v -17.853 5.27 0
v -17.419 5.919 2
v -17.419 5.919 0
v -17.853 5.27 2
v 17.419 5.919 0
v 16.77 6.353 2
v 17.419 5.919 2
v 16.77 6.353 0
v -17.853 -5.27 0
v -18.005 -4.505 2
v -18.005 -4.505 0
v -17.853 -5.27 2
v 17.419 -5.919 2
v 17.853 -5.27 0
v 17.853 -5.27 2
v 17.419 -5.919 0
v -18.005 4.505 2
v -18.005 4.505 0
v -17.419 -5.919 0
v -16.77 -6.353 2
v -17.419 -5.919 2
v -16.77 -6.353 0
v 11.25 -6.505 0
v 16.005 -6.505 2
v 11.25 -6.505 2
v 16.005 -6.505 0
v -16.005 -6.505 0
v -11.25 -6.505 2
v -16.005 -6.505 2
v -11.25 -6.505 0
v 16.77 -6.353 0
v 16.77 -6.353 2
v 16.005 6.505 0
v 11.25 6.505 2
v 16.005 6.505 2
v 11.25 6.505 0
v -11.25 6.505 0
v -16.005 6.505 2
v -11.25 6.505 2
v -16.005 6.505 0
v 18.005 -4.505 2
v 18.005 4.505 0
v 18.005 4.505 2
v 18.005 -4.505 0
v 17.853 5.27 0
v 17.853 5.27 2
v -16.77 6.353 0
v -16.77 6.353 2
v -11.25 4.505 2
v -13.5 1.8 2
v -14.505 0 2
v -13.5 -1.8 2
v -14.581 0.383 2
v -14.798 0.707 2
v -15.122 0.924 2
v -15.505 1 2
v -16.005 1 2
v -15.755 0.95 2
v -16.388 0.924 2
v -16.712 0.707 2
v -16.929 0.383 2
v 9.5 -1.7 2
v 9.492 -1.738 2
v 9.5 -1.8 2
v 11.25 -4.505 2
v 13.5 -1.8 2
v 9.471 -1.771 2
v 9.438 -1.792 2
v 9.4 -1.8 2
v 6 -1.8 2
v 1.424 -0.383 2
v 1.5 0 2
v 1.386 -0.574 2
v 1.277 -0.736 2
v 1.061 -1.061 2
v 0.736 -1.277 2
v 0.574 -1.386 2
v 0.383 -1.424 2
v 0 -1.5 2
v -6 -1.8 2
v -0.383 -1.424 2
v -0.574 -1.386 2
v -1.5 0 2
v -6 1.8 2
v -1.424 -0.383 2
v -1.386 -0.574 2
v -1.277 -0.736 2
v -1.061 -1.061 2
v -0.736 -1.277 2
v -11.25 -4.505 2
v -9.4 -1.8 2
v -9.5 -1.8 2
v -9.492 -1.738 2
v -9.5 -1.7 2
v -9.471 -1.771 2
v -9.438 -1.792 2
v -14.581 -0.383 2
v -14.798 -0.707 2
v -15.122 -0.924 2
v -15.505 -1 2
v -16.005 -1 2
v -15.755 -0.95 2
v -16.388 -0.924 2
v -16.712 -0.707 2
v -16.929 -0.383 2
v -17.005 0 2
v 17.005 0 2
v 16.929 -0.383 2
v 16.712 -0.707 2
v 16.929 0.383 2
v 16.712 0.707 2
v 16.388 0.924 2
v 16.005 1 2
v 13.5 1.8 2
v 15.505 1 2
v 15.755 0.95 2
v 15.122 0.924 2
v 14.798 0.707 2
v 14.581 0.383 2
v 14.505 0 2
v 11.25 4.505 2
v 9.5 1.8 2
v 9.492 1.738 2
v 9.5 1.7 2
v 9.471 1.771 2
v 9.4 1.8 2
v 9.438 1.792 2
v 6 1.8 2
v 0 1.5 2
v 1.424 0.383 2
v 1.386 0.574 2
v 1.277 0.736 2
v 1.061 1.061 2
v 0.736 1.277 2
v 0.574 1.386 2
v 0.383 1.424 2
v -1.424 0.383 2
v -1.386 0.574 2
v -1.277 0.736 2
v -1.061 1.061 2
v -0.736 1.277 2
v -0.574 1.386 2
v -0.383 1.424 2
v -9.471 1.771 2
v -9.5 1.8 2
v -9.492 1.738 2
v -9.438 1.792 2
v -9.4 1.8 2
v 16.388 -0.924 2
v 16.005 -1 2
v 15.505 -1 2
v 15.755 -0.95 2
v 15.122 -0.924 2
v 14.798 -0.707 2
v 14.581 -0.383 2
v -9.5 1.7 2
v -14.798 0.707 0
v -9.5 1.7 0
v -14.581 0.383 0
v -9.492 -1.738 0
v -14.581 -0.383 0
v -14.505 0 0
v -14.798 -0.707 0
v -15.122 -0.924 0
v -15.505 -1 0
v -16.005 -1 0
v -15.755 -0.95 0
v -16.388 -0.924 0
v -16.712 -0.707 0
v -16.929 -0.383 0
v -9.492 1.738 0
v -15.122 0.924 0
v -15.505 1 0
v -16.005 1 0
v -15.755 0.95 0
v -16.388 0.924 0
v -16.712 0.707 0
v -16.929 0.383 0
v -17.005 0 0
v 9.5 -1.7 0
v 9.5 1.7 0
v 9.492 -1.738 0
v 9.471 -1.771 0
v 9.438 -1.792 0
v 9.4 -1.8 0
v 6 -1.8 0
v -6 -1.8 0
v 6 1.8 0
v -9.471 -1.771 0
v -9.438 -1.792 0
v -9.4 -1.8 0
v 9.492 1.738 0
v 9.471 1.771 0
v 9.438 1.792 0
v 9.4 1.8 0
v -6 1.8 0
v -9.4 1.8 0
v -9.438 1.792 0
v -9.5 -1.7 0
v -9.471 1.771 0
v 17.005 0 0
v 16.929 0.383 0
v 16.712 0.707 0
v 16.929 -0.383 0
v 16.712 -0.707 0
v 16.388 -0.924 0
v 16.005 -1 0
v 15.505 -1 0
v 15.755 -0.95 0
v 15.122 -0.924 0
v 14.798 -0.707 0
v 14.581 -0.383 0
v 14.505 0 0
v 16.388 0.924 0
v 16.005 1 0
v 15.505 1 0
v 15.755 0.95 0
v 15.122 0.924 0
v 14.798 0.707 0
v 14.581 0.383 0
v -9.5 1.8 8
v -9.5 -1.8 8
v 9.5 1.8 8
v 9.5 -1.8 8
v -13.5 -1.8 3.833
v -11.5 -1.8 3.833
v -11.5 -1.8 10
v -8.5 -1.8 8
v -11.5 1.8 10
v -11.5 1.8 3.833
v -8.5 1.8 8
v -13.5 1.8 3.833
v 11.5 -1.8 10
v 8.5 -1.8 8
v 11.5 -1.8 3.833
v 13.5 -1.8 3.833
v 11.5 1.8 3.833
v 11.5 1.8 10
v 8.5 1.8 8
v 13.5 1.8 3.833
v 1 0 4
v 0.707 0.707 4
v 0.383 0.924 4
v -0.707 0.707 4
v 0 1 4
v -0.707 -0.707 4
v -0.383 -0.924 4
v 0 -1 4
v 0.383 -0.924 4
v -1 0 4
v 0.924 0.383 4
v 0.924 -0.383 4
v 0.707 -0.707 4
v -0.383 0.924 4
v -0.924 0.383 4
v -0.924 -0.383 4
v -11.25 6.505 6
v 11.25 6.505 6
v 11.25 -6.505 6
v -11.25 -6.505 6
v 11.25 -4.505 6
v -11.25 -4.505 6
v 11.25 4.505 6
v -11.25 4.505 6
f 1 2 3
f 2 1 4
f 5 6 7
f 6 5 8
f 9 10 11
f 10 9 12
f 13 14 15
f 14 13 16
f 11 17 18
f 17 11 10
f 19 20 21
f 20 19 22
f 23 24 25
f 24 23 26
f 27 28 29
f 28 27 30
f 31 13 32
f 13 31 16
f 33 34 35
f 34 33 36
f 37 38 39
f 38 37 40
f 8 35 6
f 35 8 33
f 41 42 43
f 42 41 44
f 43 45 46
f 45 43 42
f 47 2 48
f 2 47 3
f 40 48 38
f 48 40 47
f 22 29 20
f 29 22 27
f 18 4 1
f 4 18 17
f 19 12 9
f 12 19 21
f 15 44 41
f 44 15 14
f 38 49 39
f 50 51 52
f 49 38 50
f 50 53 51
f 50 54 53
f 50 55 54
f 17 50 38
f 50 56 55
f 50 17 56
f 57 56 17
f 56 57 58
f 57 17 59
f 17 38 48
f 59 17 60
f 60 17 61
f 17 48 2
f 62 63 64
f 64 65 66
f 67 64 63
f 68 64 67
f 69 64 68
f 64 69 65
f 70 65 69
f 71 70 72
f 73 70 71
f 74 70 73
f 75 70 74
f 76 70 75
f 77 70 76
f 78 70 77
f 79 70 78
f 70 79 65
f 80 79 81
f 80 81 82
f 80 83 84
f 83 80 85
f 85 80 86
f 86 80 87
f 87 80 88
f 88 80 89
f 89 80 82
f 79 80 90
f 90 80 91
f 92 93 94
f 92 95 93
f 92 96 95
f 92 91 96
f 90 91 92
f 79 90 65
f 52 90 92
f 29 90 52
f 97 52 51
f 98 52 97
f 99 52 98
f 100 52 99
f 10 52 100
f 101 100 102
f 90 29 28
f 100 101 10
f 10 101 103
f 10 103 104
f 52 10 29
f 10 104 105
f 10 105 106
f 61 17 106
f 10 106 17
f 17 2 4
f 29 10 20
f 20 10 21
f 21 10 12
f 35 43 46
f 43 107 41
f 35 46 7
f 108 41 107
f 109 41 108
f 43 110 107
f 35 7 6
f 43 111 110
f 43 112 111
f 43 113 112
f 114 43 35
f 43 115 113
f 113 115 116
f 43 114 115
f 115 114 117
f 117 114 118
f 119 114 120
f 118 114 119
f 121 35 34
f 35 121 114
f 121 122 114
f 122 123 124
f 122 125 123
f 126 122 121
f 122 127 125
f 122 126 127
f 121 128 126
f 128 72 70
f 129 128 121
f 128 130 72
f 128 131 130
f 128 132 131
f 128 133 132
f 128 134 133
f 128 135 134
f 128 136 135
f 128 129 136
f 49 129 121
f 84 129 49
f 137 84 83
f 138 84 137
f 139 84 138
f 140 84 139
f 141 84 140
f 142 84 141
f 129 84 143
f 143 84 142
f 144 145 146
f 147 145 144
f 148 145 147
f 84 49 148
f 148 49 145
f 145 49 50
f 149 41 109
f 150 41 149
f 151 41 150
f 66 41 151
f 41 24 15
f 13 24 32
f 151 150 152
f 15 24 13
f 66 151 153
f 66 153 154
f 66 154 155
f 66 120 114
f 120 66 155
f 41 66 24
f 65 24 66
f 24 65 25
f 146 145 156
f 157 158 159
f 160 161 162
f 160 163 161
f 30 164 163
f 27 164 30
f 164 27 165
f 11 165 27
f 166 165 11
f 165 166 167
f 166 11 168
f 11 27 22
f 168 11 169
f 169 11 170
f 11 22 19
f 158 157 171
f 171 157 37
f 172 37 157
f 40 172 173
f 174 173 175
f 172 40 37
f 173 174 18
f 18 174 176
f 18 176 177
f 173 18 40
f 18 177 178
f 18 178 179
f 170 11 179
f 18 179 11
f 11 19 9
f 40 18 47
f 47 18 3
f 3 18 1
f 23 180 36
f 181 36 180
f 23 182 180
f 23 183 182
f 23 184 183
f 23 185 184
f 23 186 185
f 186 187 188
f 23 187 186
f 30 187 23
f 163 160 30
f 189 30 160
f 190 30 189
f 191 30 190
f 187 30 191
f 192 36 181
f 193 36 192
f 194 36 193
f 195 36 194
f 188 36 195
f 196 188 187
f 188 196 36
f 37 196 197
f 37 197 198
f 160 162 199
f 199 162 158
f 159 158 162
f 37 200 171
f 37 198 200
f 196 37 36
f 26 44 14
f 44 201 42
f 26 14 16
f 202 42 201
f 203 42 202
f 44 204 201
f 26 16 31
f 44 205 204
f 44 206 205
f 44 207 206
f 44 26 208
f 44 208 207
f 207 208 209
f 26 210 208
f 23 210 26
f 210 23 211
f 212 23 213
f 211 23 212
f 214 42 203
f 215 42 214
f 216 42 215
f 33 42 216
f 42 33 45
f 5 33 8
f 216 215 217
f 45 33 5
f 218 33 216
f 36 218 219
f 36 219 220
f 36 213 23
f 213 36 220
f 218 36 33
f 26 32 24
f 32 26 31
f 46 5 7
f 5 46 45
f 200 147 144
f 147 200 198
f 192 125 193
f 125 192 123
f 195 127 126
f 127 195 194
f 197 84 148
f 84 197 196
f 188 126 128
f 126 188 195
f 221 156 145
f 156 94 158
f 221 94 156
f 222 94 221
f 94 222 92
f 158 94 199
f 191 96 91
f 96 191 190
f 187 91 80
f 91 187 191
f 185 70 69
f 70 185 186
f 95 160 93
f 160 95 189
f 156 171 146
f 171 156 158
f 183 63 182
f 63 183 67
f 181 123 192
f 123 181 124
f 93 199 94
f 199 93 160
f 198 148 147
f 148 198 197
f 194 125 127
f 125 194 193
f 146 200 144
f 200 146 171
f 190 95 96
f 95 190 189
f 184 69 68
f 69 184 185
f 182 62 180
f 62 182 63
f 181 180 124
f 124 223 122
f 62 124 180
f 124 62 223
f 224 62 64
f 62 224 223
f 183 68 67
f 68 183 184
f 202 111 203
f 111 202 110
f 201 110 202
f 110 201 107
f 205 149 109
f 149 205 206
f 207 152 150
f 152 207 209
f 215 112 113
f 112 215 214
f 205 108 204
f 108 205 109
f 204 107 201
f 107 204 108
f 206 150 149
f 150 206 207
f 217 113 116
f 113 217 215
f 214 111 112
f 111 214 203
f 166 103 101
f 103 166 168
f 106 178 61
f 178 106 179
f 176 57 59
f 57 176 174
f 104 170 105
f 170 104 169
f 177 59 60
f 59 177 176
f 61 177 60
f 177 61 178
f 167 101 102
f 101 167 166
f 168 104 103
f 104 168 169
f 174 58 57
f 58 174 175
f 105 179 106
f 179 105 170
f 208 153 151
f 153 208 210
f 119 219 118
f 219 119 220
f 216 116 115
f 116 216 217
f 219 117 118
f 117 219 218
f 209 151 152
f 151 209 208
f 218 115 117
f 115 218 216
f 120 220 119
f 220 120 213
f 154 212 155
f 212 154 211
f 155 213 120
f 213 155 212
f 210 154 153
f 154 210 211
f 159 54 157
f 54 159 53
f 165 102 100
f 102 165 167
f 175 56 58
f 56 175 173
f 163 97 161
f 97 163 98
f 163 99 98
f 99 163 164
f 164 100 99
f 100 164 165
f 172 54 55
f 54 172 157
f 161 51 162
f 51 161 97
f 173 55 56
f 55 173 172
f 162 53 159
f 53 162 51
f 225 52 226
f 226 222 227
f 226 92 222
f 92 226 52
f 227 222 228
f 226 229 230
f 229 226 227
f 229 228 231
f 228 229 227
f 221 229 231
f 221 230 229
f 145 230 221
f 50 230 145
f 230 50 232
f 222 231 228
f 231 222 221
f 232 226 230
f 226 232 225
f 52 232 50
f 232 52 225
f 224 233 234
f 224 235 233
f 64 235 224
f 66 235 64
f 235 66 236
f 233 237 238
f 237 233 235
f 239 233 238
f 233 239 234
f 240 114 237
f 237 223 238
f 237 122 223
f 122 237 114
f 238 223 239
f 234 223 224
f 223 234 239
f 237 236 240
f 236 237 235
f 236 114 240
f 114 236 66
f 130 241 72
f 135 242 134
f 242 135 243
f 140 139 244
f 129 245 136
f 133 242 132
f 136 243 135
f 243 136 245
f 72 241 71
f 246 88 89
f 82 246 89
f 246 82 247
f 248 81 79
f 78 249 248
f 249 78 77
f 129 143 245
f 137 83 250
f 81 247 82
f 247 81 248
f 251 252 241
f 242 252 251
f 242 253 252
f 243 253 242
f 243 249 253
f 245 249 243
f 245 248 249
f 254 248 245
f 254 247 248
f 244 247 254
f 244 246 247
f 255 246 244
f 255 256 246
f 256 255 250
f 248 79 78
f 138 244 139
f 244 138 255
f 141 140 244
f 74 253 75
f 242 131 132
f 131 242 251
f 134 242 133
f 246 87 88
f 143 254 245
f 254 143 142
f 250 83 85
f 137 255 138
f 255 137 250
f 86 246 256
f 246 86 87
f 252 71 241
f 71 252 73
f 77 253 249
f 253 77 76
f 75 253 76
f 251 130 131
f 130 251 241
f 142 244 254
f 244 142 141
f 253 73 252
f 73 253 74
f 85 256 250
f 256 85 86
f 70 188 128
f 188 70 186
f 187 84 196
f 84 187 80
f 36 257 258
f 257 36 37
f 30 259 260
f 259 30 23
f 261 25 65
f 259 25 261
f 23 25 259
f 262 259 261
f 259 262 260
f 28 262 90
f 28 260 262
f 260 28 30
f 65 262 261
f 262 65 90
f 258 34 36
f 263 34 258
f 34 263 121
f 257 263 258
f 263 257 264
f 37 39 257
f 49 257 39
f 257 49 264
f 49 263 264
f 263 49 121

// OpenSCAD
BASE_CORNER_RADIUS=2;
BASE_SIZE_X=36.01;
BASE_SIZE_Y=13.01;
THICKNESS=2;

BASE_CUTOUT_SIZE_X=19.0;
BASE_CUTOUT_SIZE_Y=3.6;

HOLDER_HEIGHT=10;
HOLDER_STICKOUT=1;
HOLDER_THICKNESS=THICKNESS;

HOLE_DIAMETER=2;
HOLE_DISTANCE_X= 2;

SIDE_SIZE_X=22.5;
SIDE_SIZE_Z=6;

CENTER_SIZE_X=12;

CENTER_CYL_R1=2;
CENTER_CYL_R2=1;
CENTER_CYL_H=4;

module smooth_rect(size_x, size_y, size_z, corner_radius = 0.1) {
    x1 = 0 - size_x / 2 + corner_radius;
    x2 = 0 - x1;
    y1 = 0 - size_y / 2 + corner_radius;
    y2 = 0 - y1;
    coords = [
        [x1, y1],
        [x1, y2],
        [x2, y2],
        [x2, y1]
    ];
    hull() {
        linear_extrude(size_z) {
            for(i=[0:len(coords) - 1]) {
                x = coords[i][0];
                y = coords[i][1];
                translate([x, y, 0])
                    circle(r = corner_radius, $fn=16);
            }
        }
    }
}

module holder() {
    poly = [
        [0, 0],
        [HOLDER_THICKNESS, 0],
        [0, HOLDER_STICKOUT + HOLDER_THICKNESS]
    ];

    translate([0 - HOLDER_THICKNESS / 2, 0 - BASE_CUTOUT_SIZE_Y / 2, HOLDER_HEIGHT - HOLDER_THICKNESS])
        rotate([90, -90, 180])
            linear_extrude(BASE_CUTOUT_SIZE_Y)
                polygon(poly);
    translate([0, 0, (HOLDER_HEIGHT - HOLDER_THICKNESS) / 2])
        cube([HOLDER_THICKNESS, BASE_CUTOUT_SIZE_Y, HOLDER_HEIGHT - HOLDER_THICKNESS], true);

    translate([0 - HOLDER_THICKNESS, 0, (HOLDER_HEIGHT * 2 / 3 - HOLDER_THICKNESS) / 2])
        cube([HOLDER_THICKNESS, BASE_CUTOUT_SIZE_Y, HOLDER_HEIGHT / 2 - HOLDER_THICKNESS], true);
}

module base() {
    difference() {
        smooth_rect(BASE_SIZE_X, BASE_SIZE_Y, THICKNESS, BASE_CORNER_RADIUS);
        translate([0, 0, 0 - THICKNESS / 2])
            smooth_rect(BASE_CUTOUT_SIZE_X, BASE_CUTOUT_SIZE_Y, THICKNESS * 2);
    }
}

module holes() {
    translate([BASE_SIZE_X / 2 - HOLE_DISTANCE_X, 0, 0 - THICKNESS / 2])
        cylinder(h=THICKNESS * 2, d=HOLE_DIAMETER, $fn=16);

    mirror([1, 0, 0])
        translate([BASE_SIZE_X / 2 - HOLE_DISTANCE_X, 0, 0 - THICKNESS / 2])
            cylinder(h=THICKNESS * 2, d=HOLE_DIAMETER, $fn=16);

    translate([BASE_SIZE_X / 2 - HOLE_DISTANCE_X - 0.5, 0, 0 - THICKNESS / 2])
        cylinder(h=THICKNESS * 2, d=HOLE_DIAMETER, $fn=16);

    mirror([1, 0, 0])
        translate([BASE_SIZE_X / 2 - HOLE_DISTANCE_X - 0.5, 0, 0 - THICKNESS / 2])
            cylinder(h=THICKNESS * 2, d=HOLE_DIAMETER, $fn=16);
}

module assembly() {
    difference() {
        base();
        holes();
    }
    translate([0 - BASE_CUTOUT_SIZE_X / 2 - THICKNESS / 2, 0, 0])
        holder();
    mirror([1, 0, 0])
        translate([0 - BASE_CUTOUT_SIZE_X / 2 - THICKNESS / 2, 0, 0])
            holder();
}

    cylinder(r1=CENTER_CYL_R1, r2=CENTER_CYL_R2, h=CENTER_CYL_H,$fn=16);
    translate([0, 0, THICKNESS/2])
        cube([CENTER_SIZE_X, BASE_SIZE_Y, THICKNESS], center=true);
    mirror([0,1,0])
        translate([0, BASE_SIZE_Y/2-THICKNESS/2, SIDE_SIZE_Z/2])
            cube([SIDE_SIZE_X, THICKNESS, SIDE_SIZE_Z], center=true);
    translate([0, BASE_SIZE_Y/2-THICKNESS/2, SIDE_SIZE_Z/2])
        cube([SIDE_SIZE_X, THICKNESS, SIDE_SIZE_Z], center=true);
    assembly();
